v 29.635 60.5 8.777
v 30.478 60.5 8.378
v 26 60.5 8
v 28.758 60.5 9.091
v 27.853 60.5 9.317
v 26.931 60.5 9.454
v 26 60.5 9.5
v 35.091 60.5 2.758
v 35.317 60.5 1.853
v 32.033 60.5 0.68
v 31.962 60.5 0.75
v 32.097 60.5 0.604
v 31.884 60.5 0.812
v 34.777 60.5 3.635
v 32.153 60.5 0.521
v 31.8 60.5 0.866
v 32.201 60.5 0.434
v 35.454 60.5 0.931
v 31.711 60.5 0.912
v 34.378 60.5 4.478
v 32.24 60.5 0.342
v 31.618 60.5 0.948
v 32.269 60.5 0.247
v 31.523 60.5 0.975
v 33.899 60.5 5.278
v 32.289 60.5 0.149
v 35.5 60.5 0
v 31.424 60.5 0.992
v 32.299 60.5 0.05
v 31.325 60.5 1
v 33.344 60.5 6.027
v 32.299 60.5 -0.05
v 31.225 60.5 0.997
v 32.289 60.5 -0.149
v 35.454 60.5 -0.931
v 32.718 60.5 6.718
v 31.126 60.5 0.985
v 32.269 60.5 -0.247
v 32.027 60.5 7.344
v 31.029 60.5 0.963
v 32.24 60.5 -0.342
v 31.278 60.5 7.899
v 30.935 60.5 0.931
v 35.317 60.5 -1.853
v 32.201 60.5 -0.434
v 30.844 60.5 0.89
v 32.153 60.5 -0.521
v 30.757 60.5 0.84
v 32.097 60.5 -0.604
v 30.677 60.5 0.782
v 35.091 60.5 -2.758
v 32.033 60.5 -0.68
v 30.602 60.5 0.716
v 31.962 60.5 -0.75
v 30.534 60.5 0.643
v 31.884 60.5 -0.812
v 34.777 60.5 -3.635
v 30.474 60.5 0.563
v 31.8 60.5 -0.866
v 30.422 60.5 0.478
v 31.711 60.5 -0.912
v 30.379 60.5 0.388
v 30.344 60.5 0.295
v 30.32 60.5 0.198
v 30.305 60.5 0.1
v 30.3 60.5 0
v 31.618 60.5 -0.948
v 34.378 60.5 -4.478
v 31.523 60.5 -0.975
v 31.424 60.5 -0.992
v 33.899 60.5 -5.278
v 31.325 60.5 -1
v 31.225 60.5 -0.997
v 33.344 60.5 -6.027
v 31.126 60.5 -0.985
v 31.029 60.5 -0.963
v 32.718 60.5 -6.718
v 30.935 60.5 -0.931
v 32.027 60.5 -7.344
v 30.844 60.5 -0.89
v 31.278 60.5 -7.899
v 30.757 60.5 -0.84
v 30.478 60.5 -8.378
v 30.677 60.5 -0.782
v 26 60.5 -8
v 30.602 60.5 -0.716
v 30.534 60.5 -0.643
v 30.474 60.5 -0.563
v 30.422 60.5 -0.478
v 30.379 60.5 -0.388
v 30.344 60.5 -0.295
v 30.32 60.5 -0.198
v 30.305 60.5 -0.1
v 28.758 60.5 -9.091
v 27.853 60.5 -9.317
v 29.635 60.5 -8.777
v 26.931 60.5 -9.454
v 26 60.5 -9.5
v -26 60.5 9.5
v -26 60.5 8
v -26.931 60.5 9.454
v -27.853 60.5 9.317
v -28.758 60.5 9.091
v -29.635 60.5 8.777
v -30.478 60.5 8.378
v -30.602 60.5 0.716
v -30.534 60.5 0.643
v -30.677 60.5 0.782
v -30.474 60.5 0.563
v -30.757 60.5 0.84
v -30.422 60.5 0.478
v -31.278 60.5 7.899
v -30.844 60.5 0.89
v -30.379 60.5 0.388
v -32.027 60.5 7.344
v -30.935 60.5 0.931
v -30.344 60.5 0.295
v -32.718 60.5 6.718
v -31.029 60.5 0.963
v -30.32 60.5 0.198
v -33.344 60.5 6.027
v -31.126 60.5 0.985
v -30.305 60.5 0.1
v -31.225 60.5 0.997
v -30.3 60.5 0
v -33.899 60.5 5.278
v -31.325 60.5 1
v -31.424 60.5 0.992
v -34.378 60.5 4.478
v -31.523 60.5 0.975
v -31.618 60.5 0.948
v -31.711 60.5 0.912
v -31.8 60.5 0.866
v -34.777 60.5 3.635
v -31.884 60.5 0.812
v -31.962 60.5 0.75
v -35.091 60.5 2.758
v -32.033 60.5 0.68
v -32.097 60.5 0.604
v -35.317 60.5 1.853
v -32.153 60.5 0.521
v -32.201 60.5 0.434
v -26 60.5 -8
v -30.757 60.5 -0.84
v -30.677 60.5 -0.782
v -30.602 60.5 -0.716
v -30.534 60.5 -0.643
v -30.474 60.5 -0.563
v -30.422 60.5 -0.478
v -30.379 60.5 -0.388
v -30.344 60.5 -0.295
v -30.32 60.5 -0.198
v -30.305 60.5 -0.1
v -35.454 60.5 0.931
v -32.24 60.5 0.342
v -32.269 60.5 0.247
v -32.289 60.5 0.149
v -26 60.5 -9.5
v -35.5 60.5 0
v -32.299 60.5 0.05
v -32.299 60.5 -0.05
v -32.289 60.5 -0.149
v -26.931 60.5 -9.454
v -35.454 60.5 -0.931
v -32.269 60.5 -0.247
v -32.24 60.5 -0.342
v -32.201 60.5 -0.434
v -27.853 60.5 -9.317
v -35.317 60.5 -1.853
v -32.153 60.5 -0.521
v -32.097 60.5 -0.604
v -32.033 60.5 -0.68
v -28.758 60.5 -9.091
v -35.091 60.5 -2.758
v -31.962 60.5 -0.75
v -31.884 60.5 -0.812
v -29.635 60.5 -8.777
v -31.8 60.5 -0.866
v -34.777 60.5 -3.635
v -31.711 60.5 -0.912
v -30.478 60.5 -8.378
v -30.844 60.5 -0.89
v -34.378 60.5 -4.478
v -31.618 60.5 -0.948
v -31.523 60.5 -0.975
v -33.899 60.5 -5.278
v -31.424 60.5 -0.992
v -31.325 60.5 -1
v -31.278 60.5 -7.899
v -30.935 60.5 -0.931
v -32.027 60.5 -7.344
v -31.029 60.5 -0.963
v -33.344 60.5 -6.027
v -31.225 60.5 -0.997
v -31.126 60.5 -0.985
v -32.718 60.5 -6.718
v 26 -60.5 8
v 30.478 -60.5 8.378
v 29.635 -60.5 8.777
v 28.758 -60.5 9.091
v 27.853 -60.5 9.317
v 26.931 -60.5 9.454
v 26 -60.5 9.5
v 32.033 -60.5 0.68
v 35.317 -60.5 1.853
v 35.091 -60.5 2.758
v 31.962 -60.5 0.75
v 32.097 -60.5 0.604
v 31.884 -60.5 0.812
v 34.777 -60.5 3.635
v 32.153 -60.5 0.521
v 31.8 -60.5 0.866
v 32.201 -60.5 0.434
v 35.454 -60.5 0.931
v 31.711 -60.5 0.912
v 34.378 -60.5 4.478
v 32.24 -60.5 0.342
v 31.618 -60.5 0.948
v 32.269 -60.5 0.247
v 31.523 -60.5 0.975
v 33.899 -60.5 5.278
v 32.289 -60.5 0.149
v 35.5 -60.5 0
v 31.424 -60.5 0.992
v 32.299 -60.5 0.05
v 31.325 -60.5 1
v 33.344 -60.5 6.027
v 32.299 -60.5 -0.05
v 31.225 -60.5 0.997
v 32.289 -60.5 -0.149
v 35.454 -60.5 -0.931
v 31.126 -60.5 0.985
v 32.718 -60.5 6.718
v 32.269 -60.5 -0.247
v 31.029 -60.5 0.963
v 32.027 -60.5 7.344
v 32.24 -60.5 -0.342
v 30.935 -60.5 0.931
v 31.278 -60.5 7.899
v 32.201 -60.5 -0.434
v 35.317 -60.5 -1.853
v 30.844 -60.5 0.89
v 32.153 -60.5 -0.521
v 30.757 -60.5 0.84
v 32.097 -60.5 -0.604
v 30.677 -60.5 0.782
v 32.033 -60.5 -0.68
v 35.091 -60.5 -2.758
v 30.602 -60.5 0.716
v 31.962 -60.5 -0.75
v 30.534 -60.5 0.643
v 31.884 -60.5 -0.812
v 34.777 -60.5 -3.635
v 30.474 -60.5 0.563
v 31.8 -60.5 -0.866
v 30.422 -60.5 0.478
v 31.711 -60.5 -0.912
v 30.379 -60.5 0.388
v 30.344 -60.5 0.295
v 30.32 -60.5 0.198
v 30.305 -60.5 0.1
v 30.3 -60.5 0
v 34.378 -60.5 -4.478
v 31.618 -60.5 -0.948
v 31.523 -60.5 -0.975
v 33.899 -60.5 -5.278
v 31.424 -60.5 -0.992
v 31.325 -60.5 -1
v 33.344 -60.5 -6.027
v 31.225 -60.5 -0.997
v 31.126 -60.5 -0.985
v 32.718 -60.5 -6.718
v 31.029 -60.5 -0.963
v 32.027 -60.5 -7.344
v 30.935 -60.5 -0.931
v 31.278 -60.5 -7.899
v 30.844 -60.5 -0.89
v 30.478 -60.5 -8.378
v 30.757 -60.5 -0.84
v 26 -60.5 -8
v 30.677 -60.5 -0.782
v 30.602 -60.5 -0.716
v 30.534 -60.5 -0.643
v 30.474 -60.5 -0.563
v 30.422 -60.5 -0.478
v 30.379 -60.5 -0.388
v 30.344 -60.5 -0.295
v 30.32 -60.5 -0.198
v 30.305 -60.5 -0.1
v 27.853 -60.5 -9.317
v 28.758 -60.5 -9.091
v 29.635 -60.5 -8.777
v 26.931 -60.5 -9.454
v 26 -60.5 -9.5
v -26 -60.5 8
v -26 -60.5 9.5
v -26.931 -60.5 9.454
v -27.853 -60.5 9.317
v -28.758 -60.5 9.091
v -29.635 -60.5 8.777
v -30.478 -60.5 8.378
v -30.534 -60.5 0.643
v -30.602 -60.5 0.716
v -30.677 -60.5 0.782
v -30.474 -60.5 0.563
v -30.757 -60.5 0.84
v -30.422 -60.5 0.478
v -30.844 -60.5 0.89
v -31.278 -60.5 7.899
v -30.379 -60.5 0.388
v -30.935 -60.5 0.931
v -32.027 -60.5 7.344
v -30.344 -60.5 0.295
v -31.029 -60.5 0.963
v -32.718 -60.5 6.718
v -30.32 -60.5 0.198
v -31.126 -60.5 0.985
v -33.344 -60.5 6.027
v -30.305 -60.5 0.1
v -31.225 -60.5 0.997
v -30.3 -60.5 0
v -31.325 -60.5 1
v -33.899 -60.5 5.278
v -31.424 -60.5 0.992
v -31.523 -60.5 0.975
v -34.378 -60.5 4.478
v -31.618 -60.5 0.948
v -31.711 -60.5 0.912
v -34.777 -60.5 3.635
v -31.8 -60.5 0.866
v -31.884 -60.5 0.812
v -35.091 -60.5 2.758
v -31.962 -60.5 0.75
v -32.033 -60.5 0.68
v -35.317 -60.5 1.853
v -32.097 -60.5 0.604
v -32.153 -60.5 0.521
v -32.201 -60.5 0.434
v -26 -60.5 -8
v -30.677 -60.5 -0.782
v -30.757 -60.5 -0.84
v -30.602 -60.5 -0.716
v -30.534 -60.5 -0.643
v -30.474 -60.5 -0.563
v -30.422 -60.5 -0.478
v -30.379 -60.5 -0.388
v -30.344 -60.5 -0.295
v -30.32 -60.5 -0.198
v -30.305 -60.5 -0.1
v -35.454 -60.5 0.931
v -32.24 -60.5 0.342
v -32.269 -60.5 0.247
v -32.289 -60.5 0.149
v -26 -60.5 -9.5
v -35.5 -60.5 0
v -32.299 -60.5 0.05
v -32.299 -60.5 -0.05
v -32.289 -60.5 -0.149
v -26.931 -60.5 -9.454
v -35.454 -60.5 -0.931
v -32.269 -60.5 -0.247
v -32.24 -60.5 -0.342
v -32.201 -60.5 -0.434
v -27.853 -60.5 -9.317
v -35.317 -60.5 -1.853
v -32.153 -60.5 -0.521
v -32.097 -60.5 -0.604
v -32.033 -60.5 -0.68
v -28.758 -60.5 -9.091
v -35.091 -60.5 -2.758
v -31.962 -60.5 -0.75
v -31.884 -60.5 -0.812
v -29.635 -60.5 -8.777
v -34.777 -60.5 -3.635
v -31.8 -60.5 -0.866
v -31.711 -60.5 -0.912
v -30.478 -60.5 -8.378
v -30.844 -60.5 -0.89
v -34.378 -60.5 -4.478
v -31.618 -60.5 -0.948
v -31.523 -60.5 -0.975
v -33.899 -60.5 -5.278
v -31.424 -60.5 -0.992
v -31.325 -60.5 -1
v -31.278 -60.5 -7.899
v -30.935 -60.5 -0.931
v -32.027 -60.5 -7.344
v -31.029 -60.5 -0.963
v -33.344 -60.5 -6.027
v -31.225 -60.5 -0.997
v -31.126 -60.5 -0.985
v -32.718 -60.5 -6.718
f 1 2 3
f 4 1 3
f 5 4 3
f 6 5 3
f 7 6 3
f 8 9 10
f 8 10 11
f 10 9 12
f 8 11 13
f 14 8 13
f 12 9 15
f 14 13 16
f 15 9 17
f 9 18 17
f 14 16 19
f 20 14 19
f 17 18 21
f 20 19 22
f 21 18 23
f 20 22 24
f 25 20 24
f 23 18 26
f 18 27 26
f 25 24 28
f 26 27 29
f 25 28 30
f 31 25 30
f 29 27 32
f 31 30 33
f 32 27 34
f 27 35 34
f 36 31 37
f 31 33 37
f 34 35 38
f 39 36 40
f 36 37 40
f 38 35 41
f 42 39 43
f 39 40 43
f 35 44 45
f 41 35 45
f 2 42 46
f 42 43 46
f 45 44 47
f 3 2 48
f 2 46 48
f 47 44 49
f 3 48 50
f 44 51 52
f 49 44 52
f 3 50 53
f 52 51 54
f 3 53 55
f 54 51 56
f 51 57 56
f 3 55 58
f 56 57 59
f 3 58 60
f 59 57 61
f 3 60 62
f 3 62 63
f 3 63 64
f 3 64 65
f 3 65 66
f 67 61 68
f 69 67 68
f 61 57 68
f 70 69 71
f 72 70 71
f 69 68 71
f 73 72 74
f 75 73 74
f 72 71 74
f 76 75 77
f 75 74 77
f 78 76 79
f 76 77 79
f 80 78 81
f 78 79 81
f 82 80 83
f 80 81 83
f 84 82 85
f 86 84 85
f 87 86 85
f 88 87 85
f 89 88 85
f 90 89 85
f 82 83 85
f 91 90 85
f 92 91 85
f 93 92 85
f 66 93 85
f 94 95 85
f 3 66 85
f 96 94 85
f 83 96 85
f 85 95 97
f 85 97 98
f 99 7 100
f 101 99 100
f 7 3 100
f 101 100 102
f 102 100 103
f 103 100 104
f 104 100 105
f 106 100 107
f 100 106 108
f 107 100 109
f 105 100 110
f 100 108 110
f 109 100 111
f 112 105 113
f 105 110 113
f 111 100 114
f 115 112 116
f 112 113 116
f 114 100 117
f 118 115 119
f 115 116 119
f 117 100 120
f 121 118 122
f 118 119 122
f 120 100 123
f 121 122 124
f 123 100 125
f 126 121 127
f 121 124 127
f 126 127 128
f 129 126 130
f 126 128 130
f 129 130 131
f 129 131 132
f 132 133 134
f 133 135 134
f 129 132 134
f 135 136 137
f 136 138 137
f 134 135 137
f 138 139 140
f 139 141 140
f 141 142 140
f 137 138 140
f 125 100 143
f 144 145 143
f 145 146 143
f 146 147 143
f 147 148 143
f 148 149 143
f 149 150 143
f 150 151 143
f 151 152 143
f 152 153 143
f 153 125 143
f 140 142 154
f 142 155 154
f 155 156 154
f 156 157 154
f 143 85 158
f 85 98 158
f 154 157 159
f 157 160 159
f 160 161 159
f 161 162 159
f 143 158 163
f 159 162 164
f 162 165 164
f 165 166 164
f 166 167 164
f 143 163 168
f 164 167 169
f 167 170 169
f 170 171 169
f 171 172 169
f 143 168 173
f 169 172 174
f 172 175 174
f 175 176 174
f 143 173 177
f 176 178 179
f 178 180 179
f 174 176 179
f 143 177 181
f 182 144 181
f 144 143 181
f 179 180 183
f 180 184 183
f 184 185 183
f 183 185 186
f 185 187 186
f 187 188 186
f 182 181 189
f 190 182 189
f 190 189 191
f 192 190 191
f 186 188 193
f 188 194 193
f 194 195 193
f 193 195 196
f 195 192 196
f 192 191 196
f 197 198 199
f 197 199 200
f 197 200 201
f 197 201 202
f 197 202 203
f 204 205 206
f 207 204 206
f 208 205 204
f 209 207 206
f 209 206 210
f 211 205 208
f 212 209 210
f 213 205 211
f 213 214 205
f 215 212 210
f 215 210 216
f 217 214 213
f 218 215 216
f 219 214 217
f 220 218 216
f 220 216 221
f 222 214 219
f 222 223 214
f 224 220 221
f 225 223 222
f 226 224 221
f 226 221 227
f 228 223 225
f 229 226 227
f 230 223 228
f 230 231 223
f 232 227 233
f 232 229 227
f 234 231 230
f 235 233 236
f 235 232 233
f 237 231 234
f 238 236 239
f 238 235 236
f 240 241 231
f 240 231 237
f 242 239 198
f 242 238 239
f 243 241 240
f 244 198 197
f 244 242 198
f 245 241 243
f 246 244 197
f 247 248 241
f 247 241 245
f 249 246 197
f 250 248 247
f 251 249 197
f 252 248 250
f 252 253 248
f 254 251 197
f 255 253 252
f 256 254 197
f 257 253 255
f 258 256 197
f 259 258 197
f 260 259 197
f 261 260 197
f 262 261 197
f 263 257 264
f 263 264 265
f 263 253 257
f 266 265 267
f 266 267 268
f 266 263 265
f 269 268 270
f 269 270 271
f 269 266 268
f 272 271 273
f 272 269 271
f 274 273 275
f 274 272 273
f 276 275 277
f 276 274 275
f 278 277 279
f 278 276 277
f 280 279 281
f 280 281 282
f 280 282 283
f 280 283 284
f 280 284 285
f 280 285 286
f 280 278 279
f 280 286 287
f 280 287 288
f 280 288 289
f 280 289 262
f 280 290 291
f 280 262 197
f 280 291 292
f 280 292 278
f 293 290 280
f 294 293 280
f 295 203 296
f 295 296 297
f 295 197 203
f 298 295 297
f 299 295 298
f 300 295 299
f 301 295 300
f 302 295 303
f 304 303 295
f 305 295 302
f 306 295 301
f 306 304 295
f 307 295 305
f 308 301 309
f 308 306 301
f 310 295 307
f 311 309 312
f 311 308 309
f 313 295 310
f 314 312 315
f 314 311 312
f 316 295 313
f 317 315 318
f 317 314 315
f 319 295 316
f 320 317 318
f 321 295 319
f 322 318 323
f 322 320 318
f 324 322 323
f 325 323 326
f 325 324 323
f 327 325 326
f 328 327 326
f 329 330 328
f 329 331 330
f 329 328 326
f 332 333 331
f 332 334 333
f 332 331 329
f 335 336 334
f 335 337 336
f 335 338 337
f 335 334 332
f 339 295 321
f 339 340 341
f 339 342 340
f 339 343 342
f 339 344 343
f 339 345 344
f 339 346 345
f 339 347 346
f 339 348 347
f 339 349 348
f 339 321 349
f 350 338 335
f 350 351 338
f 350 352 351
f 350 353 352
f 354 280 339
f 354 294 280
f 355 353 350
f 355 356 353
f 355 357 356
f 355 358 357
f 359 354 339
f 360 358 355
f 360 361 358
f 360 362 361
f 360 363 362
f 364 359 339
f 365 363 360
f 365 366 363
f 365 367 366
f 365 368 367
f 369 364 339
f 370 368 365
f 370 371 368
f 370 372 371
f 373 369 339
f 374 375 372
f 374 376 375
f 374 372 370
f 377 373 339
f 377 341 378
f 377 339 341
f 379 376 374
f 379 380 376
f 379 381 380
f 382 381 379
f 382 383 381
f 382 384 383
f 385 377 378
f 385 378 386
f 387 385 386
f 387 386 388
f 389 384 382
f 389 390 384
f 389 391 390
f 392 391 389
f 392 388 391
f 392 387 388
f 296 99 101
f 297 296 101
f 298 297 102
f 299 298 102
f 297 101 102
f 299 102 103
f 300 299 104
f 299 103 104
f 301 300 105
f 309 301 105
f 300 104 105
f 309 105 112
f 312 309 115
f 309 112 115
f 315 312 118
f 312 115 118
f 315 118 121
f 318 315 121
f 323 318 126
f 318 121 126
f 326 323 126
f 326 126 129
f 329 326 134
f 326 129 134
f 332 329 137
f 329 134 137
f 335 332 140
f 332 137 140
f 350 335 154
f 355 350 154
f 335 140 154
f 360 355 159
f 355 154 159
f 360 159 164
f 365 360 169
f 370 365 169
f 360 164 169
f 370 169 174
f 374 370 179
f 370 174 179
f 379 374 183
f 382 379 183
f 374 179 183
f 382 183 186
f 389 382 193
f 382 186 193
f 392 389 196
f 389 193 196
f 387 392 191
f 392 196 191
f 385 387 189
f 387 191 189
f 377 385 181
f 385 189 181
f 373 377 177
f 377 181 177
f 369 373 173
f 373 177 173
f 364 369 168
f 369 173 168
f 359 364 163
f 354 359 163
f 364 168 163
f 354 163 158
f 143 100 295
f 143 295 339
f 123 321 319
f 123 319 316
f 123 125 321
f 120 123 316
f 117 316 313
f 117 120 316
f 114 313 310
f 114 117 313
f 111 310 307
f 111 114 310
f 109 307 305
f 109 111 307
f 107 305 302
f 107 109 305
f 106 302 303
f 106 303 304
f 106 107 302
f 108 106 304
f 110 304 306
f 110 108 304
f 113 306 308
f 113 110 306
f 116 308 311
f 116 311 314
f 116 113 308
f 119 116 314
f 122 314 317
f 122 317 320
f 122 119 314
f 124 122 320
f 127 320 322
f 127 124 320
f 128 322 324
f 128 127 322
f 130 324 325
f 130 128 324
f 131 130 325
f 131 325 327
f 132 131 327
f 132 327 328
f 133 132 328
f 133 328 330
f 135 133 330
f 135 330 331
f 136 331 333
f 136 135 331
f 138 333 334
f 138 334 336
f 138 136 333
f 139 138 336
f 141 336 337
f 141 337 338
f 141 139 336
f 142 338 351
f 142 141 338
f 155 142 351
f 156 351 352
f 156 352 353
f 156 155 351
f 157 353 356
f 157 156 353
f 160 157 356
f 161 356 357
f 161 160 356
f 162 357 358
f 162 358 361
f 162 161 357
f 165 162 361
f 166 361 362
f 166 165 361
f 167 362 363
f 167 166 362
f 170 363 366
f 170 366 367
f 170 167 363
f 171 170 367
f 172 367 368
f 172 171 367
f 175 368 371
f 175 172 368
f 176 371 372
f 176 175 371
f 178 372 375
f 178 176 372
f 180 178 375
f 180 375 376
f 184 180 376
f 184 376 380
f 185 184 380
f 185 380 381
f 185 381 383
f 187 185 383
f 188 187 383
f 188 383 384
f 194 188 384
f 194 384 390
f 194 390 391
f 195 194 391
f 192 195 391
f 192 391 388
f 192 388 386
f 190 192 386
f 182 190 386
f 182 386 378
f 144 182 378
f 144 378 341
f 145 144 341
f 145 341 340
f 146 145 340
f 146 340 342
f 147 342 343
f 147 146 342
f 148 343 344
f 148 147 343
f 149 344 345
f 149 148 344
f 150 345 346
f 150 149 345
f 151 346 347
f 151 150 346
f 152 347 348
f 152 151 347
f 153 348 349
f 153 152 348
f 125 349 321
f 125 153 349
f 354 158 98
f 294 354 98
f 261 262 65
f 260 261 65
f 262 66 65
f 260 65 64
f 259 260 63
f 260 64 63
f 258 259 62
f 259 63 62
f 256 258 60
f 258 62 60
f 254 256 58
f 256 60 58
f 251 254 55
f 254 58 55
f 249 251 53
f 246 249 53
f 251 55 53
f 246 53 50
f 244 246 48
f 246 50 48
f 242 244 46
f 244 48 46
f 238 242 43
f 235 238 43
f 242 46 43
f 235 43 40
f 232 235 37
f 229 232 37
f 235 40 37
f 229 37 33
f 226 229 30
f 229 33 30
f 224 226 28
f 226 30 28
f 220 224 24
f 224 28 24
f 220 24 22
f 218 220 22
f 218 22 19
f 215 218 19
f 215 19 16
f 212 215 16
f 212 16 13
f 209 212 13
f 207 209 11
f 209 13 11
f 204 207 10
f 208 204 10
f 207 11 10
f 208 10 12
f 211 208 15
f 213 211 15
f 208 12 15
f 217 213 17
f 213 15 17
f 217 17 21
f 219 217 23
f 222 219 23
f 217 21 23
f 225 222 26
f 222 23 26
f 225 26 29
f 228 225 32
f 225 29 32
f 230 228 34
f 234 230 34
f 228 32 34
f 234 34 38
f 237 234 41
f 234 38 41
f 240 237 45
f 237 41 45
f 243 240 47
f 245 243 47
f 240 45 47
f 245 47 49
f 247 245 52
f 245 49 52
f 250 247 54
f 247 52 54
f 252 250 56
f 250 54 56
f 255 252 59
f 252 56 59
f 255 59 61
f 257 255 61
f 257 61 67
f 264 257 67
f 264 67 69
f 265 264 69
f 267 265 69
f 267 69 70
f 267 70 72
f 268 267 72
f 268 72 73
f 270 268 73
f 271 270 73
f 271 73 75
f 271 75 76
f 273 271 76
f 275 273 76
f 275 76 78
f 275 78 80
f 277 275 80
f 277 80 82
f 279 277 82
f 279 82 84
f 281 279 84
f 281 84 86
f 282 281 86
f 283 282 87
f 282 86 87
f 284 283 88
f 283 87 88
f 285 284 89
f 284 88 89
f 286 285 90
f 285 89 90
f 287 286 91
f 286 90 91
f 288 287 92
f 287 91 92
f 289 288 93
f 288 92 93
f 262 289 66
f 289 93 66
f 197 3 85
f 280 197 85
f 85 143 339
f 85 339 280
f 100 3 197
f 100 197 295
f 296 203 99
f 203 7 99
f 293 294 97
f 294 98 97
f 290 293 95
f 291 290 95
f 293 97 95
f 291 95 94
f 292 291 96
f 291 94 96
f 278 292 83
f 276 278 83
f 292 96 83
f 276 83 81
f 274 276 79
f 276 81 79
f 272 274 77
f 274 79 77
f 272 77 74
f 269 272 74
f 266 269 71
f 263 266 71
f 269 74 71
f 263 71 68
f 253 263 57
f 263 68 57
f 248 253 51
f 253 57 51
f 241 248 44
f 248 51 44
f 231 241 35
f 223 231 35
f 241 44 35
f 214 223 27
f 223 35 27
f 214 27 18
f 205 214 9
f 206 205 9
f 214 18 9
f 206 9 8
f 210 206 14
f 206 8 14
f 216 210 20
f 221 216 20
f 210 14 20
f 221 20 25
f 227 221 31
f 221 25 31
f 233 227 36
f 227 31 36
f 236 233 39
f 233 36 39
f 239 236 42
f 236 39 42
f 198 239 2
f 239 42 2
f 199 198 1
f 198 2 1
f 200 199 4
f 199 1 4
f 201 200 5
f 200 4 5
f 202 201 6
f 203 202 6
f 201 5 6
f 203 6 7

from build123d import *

# Parameters (mm, degrees)
BOSS_EXTRUDE1_DEPTH = 60.5
SHELL1_T            = -1.5
BOSS_EXTRUDE2_DEPTH = 60.5


with BuildPart() as part:
    # Sketch1 → Boss-Extrude1 (new, symmetric)
    with BuildSketch(Plane(origin=(0, 0, 0), x_dir=(1, 0, 0), z_dir=(0, 1, 0))):
        with BuildLine():
            Line((-26, 9.5), (26, 9.5))
            ThreePointArc((26, 9.5), (35.5, 0), (26, -9.5))
            Line((26, -9.5), (-26, -9.5))
            ThreePointArc((-26, -9.5), (-35.5, 0), (-26, 9.5))
        make_face()
    extrude(amount=BOSS_EXTRUDE1_DEPTH, both=True)

    # Shell1
    shell1_openings = [part.faces().sort_by_distance(p)[0] for p in [
        (0, 60.5, 0),
        (0, -60.5, 0),
    ]]
    offset(amount=SHELL1_T, openings=shell1_openings, kind=Kind.INTERSECTION)

    # Sketch2 → Boss-Extrude2 (add, symmetric)
    with BuildSketch(Plane(origin=(0, 0, 0), x_dir=(1, 0, 0), z_dir=(0, 1, 0))):
        with BuildLine():
            ThreePointArc((-34, 0), (-31.656854249, -5.656854249), (-26, -8))
            Line((-26, -8), (-26, 0))
            Line((-26, 0), (-30.3, 0))
            ThreePointArc((-30.3, 0), (-31.3, -1), (-32.3, 0))
            Line((-32.3, 0), (-34, 0))
        make_face()
        with BuildLine():
            Line((-30.3, 0), (-26, 0))
            Line((-26, 0), (-26, 8))
            ThreePointArc((-26, 8), (-31.656854249, 5.656854249), (-34, 0))
            Line((-34, 0), (-32.3, 0))
            ThreePointArc((-32.3, 0), (-31.3, 1), (-30.3, 0))
        make_face()
    boss_extrude2 = extrude(amount=BOSS_EXTRUDE2_DEPTH, both=True)

    # Mirror1: Boss-Extrude2 across plane
    add(boss_extrude2.mirror(Plane(origin=(0, 0, 0), x_dir=(0, 0, 1), z_dir=(1, 0, 0))))


solid = part.part
